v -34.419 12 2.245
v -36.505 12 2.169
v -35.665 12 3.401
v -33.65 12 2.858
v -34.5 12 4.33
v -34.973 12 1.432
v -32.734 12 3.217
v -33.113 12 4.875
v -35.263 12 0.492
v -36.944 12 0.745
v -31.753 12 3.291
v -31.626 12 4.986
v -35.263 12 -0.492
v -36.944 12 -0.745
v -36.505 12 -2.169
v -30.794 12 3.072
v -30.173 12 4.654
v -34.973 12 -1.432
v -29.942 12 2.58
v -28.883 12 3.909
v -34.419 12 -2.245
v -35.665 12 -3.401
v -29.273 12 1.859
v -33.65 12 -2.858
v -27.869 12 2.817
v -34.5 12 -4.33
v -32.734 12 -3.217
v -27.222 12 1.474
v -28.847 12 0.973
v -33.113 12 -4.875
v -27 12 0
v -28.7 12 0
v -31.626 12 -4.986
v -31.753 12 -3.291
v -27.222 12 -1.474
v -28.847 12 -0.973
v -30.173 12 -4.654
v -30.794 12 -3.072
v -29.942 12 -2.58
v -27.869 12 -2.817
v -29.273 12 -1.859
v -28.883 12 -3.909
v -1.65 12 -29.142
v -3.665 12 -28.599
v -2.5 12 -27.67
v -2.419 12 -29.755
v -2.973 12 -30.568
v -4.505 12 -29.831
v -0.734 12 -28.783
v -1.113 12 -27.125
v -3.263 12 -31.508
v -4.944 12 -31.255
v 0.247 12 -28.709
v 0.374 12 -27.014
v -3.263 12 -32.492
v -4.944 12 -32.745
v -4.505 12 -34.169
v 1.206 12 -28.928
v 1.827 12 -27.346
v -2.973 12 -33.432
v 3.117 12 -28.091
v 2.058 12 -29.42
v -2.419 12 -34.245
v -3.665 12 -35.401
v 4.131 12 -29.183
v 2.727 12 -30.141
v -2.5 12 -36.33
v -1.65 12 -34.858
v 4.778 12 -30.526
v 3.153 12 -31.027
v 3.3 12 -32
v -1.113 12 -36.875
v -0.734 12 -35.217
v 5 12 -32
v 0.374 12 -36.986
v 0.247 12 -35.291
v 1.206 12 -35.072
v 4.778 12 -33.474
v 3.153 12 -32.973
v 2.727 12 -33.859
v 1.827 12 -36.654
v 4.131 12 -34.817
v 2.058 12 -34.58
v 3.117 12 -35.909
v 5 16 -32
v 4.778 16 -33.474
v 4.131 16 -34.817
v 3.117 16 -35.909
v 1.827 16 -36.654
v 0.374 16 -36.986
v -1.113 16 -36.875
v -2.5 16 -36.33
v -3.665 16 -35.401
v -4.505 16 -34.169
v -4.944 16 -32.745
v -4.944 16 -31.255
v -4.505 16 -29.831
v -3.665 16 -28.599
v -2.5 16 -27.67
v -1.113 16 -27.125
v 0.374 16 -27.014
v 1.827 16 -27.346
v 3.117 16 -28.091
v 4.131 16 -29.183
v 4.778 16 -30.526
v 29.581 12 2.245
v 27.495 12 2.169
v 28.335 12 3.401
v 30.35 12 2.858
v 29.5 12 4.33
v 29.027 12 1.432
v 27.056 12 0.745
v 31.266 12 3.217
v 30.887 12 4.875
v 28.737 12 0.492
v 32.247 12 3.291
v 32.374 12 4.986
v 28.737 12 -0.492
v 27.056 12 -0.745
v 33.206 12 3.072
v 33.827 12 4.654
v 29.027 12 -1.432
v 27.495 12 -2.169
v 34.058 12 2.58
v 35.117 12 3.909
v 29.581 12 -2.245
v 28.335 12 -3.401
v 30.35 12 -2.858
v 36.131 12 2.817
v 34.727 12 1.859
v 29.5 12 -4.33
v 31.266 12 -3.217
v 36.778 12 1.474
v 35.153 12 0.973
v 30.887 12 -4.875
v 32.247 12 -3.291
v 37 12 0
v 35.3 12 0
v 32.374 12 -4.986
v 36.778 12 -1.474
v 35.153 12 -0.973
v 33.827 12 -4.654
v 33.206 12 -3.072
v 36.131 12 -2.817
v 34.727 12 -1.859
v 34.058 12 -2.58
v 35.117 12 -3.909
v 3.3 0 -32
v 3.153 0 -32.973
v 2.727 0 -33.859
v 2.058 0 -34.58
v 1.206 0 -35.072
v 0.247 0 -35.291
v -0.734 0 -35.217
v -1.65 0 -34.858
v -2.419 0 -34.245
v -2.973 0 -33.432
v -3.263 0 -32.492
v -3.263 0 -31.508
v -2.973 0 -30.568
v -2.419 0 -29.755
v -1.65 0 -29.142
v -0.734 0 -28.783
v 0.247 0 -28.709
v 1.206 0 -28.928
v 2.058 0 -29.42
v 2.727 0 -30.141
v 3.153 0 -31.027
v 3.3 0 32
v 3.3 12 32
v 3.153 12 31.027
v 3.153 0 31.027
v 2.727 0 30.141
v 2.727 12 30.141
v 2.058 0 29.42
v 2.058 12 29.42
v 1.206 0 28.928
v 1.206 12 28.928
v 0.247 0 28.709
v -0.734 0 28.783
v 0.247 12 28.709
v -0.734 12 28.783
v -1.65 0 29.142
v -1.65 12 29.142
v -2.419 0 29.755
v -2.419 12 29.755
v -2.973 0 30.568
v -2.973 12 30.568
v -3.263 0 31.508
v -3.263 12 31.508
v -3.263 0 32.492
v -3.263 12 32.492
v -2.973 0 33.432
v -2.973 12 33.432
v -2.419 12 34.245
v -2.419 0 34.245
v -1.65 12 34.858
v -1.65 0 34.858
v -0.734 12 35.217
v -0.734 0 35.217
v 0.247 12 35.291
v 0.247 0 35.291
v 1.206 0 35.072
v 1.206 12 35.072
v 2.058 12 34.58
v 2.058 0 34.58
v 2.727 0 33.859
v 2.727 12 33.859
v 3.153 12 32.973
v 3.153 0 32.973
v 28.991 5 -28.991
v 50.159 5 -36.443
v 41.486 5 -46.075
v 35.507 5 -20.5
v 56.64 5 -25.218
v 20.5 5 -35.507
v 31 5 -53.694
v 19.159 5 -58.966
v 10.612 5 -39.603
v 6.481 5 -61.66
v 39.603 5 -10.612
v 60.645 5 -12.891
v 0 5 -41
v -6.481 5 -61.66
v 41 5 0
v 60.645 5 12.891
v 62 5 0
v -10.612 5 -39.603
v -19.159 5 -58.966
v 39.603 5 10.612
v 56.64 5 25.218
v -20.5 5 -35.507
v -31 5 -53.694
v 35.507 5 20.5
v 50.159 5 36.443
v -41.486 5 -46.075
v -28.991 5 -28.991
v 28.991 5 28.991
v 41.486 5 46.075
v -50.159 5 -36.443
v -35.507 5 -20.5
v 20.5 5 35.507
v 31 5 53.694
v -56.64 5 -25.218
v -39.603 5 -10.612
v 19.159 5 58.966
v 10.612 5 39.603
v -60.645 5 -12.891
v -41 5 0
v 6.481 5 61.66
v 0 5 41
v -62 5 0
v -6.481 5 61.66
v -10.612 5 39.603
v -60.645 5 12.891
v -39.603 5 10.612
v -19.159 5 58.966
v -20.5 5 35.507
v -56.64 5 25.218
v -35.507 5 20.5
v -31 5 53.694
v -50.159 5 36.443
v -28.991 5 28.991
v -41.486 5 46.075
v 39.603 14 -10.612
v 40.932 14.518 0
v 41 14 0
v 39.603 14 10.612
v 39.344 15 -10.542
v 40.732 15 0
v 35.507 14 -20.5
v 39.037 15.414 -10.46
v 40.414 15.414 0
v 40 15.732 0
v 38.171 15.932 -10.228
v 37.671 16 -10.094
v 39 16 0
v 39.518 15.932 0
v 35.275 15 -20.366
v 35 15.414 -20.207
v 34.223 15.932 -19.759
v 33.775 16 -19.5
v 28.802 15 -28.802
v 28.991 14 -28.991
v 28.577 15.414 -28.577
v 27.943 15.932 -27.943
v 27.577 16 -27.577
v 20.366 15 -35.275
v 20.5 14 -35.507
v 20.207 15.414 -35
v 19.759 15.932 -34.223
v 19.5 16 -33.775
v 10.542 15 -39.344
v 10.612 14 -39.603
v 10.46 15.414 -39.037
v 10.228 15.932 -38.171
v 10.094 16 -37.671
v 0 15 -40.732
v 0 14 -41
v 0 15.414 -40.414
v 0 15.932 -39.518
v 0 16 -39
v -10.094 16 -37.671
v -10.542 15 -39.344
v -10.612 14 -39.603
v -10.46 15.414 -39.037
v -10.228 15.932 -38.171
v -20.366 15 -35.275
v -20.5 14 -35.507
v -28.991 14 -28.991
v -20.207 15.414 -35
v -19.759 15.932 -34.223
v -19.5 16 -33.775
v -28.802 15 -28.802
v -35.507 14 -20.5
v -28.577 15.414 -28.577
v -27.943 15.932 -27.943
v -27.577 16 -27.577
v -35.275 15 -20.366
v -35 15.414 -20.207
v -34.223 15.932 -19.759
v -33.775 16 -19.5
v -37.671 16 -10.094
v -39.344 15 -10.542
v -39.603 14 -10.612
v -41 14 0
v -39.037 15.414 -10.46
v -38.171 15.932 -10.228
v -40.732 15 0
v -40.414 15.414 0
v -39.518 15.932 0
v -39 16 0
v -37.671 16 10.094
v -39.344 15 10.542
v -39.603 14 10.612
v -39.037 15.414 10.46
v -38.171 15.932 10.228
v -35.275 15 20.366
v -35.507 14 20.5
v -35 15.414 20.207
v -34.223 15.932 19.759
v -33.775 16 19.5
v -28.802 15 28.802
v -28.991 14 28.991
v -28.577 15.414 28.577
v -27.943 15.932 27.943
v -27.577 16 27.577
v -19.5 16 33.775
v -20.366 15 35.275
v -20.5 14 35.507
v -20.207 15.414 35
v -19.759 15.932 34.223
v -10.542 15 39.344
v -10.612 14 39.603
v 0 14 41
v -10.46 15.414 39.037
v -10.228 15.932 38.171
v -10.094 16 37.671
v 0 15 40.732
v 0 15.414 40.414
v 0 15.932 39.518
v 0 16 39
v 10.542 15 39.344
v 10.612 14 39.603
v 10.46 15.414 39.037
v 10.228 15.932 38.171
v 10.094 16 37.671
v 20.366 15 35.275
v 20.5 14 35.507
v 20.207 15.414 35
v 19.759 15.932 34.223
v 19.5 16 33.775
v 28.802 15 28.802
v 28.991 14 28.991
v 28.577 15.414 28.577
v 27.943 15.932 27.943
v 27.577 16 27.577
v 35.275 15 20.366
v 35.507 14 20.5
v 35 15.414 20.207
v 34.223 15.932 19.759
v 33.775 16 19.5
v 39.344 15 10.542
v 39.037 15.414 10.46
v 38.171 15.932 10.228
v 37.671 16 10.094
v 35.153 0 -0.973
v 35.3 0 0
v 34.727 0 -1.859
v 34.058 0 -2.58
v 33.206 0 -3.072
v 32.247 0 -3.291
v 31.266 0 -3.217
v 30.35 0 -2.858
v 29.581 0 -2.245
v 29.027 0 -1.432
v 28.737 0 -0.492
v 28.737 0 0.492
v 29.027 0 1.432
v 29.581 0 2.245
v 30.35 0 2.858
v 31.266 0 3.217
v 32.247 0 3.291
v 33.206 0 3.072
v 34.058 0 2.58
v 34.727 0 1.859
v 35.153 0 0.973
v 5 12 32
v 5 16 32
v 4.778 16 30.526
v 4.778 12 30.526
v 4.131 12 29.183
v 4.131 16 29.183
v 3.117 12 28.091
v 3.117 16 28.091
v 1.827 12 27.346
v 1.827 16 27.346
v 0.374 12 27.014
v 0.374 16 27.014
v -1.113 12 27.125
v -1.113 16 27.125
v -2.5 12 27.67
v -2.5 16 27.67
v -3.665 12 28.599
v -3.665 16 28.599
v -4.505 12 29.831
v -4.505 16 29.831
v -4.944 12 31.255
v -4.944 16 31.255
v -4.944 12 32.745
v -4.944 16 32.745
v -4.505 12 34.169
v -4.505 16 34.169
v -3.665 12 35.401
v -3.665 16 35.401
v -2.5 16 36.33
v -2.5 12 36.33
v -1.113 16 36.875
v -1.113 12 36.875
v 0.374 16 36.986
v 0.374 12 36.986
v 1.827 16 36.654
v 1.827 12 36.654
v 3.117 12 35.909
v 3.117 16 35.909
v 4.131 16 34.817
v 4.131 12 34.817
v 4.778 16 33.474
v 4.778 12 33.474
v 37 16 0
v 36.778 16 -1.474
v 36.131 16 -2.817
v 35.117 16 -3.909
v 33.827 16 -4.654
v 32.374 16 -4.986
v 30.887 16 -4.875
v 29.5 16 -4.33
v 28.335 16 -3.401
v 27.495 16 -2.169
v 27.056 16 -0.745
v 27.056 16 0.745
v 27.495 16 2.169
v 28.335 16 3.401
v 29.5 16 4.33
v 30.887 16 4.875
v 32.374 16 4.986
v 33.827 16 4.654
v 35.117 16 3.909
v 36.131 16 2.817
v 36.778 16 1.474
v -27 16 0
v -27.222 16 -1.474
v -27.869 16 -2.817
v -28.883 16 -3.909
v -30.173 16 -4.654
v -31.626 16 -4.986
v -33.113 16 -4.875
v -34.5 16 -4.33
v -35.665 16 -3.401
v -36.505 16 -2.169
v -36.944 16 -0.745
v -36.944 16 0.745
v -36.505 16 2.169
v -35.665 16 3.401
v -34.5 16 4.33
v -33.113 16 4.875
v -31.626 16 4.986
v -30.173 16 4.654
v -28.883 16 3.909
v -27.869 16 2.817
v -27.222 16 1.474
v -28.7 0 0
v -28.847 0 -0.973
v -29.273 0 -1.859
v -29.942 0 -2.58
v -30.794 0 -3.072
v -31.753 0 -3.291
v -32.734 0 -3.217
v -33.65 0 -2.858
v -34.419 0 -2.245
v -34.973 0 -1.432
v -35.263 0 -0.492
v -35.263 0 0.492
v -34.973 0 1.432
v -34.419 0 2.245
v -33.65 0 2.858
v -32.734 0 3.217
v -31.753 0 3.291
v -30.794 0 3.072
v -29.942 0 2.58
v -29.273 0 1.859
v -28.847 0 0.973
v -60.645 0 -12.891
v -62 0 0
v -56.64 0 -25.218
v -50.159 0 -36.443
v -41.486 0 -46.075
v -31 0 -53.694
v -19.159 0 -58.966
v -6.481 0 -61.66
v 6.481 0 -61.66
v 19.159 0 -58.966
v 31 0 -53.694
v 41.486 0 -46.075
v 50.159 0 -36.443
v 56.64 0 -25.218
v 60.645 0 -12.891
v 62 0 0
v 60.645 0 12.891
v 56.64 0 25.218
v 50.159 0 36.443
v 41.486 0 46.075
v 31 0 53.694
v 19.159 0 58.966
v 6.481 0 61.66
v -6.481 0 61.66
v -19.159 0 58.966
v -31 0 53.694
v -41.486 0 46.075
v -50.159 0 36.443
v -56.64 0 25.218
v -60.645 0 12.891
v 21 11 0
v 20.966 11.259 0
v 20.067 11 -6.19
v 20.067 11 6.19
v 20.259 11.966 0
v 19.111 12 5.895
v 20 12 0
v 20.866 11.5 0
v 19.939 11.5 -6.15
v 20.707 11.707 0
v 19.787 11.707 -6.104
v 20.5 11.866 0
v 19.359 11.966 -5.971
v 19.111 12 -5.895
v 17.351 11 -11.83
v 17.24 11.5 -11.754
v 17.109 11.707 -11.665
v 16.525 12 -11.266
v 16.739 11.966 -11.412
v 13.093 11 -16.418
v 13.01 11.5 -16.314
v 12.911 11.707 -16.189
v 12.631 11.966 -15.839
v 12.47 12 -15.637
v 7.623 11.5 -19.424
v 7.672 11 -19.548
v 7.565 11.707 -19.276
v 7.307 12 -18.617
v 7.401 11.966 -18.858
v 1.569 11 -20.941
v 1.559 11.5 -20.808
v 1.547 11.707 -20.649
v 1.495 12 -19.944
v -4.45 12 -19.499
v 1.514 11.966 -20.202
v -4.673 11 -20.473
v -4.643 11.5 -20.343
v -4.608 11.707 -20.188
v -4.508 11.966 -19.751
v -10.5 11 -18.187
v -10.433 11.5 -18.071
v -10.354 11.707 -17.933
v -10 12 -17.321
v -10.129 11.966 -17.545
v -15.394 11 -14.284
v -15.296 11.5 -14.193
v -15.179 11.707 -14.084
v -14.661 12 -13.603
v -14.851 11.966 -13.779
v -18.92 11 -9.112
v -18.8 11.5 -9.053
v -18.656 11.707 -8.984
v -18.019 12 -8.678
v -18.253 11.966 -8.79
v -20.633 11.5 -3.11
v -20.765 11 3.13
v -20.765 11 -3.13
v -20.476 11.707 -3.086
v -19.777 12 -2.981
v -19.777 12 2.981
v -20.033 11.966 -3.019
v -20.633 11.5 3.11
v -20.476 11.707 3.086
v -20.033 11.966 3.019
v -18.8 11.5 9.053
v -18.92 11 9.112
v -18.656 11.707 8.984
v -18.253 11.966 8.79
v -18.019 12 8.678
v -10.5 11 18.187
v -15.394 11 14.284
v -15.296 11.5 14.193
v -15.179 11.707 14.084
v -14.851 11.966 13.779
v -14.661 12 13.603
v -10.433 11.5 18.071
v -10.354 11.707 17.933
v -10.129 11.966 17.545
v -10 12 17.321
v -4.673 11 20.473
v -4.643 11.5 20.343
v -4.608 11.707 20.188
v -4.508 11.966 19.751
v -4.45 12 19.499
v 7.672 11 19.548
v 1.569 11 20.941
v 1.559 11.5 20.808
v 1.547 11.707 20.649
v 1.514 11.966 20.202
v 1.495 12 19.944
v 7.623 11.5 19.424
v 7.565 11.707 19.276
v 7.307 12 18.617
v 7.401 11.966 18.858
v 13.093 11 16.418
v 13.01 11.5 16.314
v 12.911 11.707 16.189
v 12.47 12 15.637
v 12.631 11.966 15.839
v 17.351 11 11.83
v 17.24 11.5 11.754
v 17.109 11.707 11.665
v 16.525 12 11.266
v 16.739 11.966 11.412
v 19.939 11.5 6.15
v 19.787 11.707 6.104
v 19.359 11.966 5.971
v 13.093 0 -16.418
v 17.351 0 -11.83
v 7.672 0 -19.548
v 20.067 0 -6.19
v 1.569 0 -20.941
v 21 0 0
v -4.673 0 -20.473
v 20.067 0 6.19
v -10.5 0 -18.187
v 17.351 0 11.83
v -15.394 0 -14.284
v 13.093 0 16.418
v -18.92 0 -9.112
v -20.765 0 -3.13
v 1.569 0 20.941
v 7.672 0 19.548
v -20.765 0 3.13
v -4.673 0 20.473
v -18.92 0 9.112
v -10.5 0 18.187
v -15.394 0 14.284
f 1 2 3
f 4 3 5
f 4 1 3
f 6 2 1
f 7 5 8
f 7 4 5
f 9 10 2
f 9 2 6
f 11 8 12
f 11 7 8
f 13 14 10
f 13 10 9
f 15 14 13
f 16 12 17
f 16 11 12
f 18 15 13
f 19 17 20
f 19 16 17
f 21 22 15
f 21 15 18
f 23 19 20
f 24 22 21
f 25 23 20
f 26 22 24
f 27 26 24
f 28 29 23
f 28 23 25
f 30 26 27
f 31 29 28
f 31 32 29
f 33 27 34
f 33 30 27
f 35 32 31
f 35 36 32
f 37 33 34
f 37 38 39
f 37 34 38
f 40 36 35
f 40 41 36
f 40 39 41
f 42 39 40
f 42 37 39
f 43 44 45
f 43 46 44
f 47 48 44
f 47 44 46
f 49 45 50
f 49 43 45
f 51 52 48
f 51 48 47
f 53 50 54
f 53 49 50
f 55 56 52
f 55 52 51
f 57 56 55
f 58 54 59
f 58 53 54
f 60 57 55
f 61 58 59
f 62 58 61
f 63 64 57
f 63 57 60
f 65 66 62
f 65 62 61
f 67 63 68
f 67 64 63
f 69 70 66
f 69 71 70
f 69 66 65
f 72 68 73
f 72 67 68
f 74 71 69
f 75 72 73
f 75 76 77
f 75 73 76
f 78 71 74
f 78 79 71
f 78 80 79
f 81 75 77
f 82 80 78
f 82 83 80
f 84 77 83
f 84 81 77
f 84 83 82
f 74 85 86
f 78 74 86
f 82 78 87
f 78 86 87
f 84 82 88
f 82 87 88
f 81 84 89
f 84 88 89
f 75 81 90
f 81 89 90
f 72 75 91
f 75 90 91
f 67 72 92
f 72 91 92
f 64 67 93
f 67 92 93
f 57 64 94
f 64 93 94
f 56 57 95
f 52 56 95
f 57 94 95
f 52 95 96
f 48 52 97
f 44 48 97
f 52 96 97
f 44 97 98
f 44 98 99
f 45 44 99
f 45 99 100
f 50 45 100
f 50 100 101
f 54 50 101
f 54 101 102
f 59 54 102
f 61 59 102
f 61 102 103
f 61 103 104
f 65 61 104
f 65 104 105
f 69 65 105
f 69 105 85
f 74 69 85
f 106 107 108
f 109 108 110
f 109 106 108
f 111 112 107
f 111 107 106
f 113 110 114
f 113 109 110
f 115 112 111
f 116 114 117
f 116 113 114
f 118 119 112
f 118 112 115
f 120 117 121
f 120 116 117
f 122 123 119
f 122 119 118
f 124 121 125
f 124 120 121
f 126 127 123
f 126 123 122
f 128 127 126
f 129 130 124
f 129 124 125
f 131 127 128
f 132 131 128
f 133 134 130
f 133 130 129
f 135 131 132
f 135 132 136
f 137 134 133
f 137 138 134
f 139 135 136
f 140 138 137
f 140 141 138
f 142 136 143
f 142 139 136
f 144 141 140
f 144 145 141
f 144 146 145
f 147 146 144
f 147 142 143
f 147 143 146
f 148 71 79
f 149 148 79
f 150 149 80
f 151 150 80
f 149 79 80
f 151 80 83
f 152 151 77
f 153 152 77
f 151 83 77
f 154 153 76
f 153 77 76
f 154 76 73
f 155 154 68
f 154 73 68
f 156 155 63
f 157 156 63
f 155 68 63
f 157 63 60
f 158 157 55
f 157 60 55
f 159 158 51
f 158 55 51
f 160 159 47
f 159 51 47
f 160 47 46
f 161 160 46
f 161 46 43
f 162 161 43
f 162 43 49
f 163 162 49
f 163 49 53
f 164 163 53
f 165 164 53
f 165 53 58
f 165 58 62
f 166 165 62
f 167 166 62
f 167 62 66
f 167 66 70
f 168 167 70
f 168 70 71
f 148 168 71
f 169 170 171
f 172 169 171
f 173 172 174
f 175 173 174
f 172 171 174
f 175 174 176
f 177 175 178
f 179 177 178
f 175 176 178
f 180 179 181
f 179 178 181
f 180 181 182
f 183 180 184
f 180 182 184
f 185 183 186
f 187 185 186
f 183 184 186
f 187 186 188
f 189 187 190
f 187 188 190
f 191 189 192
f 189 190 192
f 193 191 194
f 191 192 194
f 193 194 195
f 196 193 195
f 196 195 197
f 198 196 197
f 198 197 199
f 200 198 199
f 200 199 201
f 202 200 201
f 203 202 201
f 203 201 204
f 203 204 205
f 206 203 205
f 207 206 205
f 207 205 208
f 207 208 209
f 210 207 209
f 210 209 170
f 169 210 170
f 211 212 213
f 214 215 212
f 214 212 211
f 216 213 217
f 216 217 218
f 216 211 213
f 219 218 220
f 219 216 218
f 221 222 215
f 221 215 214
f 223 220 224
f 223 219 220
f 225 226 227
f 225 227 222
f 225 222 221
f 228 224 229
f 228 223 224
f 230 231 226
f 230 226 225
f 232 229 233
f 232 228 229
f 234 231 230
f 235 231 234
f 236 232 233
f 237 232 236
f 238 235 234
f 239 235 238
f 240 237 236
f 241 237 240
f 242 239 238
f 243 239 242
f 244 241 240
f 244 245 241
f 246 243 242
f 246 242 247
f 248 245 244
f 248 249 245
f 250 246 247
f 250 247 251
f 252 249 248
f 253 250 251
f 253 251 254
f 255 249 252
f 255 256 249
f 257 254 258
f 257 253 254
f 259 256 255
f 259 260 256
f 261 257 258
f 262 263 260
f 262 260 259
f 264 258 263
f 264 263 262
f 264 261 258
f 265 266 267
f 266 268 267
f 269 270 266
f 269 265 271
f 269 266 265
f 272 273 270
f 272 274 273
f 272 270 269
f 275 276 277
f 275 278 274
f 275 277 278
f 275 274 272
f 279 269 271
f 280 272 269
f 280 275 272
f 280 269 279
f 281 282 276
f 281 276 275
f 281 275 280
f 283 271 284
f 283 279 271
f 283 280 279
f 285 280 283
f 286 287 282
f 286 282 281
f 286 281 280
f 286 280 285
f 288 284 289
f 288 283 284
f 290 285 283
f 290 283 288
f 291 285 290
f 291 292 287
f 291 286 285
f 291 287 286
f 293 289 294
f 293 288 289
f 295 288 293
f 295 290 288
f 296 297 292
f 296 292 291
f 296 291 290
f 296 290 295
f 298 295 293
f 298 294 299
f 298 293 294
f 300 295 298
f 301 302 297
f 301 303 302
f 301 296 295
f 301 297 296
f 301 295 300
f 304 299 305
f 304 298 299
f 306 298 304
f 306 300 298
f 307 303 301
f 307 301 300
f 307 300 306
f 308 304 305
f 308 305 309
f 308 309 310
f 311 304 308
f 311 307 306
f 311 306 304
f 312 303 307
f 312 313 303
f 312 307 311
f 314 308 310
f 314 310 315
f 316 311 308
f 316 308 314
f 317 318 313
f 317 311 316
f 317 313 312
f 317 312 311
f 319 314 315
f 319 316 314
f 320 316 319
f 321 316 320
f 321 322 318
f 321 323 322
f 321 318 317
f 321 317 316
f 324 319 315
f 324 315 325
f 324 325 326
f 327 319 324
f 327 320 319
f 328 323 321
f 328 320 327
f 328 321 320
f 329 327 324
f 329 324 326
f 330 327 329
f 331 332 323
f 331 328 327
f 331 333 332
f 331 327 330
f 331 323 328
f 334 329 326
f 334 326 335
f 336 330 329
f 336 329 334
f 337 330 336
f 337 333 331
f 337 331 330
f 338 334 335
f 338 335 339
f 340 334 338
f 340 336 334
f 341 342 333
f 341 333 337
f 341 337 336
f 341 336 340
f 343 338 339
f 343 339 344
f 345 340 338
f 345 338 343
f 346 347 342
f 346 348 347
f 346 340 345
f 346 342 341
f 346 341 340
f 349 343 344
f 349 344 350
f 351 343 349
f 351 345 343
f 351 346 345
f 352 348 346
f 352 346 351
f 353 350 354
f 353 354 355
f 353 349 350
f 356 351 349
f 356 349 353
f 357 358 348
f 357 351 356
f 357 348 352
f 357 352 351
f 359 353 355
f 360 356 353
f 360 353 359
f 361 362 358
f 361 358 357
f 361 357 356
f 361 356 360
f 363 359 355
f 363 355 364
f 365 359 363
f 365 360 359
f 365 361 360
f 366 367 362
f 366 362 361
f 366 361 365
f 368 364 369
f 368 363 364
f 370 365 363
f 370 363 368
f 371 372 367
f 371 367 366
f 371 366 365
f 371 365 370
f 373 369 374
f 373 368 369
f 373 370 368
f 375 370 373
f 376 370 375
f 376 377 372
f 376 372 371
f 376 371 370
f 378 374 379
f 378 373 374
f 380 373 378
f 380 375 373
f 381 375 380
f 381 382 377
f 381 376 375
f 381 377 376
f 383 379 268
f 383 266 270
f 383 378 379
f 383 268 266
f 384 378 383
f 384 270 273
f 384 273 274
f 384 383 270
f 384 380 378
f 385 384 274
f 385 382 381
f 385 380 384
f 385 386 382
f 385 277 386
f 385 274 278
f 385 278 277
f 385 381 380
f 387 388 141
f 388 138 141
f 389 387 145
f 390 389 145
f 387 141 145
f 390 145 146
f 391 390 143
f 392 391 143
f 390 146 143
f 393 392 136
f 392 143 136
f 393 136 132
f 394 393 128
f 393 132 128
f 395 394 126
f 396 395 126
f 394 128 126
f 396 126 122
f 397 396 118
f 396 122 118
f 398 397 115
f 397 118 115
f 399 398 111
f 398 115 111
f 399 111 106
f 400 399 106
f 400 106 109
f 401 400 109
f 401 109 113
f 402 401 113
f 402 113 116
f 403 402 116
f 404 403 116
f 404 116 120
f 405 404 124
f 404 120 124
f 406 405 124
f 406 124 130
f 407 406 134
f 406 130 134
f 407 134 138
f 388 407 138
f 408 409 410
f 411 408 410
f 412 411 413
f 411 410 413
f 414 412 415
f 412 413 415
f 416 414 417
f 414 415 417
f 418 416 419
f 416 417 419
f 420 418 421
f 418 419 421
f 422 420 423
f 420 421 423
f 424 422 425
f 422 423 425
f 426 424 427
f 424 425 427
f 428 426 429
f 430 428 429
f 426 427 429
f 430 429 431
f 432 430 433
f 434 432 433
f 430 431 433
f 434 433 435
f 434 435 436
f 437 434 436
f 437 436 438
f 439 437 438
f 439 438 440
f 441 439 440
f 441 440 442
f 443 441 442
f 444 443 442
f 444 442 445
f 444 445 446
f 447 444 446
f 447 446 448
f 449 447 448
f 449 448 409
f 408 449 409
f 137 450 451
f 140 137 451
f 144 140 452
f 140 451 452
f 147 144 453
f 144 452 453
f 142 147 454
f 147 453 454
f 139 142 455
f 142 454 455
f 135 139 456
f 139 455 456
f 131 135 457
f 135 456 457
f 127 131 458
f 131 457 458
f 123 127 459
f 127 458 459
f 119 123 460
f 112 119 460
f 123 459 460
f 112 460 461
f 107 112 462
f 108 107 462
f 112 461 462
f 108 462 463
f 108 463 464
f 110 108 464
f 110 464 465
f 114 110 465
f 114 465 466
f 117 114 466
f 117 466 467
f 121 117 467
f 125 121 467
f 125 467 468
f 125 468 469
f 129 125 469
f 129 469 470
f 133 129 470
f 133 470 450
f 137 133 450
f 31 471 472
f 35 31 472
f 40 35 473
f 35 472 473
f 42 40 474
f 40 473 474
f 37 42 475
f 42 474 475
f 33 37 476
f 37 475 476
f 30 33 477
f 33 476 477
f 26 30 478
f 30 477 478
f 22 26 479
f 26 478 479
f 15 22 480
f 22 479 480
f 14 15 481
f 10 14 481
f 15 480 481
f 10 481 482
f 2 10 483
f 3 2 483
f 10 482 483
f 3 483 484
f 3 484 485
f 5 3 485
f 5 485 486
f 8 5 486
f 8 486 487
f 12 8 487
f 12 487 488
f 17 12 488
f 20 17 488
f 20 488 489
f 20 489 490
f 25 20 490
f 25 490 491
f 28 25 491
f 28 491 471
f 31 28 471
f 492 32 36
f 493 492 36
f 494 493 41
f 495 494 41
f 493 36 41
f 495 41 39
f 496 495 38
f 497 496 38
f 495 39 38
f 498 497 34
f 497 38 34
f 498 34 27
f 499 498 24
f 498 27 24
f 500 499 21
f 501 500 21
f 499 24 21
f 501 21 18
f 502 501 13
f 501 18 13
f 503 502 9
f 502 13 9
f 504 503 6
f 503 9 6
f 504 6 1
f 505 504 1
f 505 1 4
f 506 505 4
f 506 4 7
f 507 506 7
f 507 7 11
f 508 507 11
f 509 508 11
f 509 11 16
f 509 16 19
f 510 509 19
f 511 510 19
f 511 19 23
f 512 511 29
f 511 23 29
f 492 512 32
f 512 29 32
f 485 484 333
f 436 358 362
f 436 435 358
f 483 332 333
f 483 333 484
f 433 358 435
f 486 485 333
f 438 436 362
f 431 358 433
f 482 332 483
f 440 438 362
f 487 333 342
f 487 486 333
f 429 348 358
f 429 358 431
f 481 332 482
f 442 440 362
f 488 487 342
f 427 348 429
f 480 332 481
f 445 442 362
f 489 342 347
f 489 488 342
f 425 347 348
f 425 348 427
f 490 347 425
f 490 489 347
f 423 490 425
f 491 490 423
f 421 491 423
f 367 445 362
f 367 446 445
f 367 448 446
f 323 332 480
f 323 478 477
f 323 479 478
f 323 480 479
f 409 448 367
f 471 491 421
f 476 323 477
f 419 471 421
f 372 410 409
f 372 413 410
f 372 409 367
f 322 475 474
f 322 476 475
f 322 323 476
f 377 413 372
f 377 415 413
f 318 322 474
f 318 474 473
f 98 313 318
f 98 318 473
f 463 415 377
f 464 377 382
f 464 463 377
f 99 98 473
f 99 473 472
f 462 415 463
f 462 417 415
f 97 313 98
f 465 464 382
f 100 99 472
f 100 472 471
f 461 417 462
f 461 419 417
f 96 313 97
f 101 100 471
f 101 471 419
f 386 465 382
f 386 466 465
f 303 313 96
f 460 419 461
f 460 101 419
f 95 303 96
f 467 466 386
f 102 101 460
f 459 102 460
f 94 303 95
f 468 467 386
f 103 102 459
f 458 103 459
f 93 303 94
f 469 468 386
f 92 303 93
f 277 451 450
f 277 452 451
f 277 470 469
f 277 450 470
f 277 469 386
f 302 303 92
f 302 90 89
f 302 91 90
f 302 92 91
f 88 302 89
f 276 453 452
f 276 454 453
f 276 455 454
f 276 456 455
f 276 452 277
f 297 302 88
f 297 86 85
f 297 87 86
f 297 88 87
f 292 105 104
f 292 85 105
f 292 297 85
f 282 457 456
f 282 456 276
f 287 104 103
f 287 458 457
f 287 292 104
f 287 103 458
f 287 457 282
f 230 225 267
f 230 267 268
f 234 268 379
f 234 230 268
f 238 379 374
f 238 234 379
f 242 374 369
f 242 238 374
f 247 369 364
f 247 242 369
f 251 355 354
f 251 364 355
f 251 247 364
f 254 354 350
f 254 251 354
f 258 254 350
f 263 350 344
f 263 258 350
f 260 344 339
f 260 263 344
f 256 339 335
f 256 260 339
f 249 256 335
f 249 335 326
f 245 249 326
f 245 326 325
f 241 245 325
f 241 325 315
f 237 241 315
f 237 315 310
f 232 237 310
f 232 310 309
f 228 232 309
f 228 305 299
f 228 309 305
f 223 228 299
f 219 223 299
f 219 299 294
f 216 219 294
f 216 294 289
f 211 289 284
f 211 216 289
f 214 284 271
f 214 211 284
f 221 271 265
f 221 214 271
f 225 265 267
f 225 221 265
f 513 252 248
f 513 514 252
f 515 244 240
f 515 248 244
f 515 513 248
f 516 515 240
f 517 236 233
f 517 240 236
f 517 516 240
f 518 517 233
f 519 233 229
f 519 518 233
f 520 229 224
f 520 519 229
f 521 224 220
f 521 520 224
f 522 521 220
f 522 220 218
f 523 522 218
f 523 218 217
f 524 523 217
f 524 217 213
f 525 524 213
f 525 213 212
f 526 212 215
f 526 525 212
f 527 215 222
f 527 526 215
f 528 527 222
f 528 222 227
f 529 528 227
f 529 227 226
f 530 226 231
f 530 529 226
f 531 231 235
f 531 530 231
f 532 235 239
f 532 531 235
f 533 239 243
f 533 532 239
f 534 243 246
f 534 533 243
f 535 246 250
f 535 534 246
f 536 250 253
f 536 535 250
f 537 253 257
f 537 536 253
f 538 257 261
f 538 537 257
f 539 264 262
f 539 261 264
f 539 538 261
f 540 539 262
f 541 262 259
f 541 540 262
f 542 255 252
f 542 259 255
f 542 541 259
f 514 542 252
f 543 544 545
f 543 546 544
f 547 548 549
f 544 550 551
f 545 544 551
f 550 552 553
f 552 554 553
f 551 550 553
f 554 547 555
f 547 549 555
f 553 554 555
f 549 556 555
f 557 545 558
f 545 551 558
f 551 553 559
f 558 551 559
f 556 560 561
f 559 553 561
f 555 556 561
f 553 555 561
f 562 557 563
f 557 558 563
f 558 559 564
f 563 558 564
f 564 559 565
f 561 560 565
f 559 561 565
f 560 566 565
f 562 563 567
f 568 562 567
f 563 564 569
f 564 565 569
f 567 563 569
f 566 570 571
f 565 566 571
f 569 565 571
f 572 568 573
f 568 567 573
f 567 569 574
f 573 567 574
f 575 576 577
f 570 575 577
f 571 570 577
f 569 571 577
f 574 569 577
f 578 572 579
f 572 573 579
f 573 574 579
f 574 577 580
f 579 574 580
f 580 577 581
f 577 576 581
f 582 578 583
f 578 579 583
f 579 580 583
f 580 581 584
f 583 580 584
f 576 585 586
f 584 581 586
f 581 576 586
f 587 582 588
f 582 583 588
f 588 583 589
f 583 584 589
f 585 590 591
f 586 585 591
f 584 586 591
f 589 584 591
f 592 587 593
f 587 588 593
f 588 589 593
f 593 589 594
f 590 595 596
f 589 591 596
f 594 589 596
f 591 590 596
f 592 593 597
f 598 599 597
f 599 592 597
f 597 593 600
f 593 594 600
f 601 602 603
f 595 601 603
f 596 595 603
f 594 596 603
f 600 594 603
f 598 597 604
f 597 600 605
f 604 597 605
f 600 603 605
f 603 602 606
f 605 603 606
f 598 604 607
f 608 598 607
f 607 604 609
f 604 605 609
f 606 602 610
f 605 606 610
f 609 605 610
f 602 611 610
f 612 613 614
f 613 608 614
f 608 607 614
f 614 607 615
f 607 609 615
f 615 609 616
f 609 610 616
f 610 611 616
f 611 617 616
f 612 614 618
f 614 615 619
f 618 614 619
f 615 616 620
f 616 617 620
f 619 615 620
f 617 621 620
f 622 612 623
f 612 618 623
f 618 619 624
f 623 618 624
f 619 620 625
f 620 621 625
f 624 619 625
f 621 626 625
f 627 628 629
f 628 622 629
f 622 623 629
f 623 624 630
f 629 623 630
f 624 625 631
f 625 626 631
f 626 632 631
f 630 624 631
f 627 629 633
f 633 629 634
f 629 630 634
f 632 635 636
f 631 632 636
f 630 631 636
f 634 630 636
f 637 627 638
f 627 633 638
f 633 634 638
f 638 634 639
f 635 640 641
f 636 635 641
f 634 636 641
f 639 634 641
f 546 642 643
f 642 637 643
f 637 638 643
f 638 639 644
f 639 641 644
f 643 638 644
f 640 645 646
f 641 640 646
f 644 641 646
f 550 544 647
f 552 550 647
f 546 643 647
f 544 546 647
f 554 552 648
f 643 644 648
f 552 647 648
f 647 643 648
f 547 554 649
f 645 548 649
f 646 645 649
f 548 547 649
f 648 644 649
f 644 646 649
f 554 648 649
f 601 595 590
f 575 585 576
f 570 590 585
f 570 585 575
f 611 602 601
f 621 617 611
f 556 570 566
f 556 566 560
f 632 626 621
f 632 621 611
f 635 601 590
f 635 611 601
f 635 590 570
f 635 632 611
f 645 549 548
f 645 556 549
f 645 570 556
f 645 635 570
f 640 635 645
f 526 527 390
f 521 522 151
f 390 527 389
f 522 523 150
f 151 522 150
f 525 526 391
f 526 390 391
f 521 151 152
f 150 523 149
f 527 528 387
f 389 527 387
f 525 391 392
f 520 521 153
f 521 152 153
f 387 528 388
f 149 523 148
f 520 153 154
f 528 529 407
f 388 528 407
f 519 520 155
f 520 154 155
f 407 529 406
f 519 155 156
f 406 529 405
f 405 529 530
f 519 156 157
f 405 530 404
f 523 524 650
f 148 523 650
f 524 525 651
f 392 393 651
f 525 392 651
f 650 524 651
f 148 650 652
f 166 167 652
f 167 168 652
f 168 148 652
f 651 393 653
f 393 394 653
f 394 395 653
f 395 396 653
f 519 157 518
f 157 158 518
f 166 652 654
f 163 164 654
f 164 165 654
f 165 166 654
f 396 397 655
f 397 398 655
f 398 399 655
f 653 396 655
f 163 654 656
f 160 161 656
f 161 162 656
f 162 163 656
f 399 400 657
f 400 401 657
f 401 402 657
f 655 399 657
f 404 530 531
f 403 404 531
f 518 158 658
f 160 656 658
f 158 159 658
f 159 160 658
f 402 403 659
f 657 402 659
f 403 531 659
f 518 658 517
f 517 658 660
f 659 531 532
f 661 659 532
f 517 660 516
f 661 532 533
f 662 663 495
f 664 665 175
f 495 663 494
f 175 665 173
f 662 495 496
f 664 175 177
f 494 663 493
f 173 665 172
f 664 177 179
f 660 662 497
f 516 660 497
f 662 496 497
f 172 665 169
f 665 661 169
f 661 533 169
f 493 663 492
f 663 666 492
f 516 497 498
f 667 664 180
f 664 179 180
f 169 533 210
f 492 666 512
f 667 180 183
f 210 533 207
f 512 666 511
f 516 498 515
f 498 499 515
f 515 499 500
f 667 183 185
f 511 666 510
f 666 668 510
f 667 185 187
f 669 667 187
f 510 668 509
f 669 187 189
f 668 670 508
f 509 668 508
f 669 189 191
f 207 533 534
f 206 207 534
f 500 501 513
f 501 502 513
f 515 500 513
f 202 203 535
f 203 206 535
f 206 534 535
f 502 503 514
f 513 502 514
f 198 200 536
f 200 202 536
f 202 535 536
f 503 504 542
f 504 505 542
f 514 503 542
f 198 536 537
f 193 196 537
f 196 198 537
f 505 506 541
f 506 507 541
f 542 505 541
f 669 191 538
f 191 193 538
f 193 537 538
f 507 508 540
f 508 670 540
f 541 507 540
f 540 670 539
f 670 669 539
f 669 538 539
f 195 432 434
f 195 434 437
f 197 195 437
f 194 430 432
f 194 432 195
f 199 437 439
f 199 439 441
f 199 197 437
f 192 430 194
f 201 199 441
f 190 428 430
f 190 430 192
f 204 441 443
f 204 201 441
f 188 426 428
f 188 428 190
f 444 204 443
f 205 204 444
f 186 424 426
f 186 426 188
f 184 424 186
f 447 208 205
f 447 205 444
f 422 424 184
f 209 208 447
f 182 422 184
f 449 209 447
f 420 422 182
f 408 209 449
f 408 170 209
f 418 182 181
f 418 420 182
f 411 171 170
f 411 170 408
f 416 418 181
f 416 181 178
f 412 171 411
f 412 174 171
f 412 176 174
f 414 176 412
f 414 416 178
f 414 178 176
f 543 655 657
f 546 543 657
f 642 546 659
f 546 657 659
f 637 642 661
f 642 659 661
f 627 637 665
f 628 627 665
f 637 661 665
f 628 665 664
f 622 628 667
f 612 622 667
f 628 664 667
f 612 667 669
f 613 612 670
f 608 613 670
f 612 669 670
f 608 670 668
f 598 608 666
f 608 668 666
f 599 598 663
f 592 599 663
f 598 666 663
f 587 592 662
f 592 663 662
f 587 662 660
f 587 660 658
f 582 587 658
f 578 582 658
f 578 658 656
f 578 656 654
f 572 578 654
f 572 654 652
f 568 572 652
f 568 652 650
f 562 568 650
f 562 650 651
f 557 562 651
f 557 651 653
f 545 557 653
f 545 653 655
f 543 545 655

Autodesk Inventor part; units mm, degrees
ref_plane "YZ Plane" through (0, 0, 0) normal (1, 0, 0) x (0, 1, 0)
ref_plane "XZ Plane" through (0, 0, 0) normal (0, 1, 0) x (-1, 0, 0)
ref_plane "XY Plane" through (0, 0, 0) normal (0, 0, 1) x (1, 0, 0)
sketch "Boceto1" plane through (0, 0, 0) normal (0, 1, 0) x (-1, 0, 0)
  circle A0 centre (0, 0) radius 62
  dimension "d0" = 124
extrude "Extrusión1" add sketch "Boceto1" along normal blind 5
sketch "Boceto2" plane through (0, 5, 0) normal (0, 1, 0) x (1, 0, 0)
  circle A0 centre (0, 0) radius 41
  dimension "d3" = 82
extrude "Extrusión2" add sketch "Boceto2" along normal blind 11
sketch "Boceto3" plane through (0, 16, 0) normal (0, 1, 0) x (1, 0, 0)
  circle A0 centre (-32, 0) radius 5
  circle A1 centre (0, -32) radius 5
  circle A2 centre (32, 0) radius 5
  circle A3 centre (0, 32) radius 5
  point P0 (0, 0)
  dimension "d7" = 10
  dimension "d10" = 360
extrude "Extrusión3" cut sketch "Boceto3" against normal blind 4
sketch "Boceto4" plane through (32, 12, 0) normal (0, 1, 0) x (1, 0, 0)
  circle A0 centre (0, 0) radius 3.3
  circle A1 centre (-32, 32) radius 3.3
  circle A2 centre (-64, 0) radius 3.3
  circle A3 centre (-32, -32) radius 3.3
  point P0 (-32, 0)
  dimension "d14" = 6.6
  dimension "d17" = 360
extrude "Extrusión4" cut sketch "Boceto4" against normal blind 12
sketch "Boceto5" plane through (0, 0, 0) normal (0, -1, 0) x (1, 0, 0)
  circle A0 centre (0, 0) radius 21
  dimension "d21" = 42
extrude "Extrusión5" cut sketch "Boceto5" against normal blind 12
fillet "Empalme1" radius 2 1 edges at (-41, 16, 0)
fillet "Empalme2" radius 1 1 edges at (-21, 12, 0)
properties part number "Trabajo Dibujo pieza1"
